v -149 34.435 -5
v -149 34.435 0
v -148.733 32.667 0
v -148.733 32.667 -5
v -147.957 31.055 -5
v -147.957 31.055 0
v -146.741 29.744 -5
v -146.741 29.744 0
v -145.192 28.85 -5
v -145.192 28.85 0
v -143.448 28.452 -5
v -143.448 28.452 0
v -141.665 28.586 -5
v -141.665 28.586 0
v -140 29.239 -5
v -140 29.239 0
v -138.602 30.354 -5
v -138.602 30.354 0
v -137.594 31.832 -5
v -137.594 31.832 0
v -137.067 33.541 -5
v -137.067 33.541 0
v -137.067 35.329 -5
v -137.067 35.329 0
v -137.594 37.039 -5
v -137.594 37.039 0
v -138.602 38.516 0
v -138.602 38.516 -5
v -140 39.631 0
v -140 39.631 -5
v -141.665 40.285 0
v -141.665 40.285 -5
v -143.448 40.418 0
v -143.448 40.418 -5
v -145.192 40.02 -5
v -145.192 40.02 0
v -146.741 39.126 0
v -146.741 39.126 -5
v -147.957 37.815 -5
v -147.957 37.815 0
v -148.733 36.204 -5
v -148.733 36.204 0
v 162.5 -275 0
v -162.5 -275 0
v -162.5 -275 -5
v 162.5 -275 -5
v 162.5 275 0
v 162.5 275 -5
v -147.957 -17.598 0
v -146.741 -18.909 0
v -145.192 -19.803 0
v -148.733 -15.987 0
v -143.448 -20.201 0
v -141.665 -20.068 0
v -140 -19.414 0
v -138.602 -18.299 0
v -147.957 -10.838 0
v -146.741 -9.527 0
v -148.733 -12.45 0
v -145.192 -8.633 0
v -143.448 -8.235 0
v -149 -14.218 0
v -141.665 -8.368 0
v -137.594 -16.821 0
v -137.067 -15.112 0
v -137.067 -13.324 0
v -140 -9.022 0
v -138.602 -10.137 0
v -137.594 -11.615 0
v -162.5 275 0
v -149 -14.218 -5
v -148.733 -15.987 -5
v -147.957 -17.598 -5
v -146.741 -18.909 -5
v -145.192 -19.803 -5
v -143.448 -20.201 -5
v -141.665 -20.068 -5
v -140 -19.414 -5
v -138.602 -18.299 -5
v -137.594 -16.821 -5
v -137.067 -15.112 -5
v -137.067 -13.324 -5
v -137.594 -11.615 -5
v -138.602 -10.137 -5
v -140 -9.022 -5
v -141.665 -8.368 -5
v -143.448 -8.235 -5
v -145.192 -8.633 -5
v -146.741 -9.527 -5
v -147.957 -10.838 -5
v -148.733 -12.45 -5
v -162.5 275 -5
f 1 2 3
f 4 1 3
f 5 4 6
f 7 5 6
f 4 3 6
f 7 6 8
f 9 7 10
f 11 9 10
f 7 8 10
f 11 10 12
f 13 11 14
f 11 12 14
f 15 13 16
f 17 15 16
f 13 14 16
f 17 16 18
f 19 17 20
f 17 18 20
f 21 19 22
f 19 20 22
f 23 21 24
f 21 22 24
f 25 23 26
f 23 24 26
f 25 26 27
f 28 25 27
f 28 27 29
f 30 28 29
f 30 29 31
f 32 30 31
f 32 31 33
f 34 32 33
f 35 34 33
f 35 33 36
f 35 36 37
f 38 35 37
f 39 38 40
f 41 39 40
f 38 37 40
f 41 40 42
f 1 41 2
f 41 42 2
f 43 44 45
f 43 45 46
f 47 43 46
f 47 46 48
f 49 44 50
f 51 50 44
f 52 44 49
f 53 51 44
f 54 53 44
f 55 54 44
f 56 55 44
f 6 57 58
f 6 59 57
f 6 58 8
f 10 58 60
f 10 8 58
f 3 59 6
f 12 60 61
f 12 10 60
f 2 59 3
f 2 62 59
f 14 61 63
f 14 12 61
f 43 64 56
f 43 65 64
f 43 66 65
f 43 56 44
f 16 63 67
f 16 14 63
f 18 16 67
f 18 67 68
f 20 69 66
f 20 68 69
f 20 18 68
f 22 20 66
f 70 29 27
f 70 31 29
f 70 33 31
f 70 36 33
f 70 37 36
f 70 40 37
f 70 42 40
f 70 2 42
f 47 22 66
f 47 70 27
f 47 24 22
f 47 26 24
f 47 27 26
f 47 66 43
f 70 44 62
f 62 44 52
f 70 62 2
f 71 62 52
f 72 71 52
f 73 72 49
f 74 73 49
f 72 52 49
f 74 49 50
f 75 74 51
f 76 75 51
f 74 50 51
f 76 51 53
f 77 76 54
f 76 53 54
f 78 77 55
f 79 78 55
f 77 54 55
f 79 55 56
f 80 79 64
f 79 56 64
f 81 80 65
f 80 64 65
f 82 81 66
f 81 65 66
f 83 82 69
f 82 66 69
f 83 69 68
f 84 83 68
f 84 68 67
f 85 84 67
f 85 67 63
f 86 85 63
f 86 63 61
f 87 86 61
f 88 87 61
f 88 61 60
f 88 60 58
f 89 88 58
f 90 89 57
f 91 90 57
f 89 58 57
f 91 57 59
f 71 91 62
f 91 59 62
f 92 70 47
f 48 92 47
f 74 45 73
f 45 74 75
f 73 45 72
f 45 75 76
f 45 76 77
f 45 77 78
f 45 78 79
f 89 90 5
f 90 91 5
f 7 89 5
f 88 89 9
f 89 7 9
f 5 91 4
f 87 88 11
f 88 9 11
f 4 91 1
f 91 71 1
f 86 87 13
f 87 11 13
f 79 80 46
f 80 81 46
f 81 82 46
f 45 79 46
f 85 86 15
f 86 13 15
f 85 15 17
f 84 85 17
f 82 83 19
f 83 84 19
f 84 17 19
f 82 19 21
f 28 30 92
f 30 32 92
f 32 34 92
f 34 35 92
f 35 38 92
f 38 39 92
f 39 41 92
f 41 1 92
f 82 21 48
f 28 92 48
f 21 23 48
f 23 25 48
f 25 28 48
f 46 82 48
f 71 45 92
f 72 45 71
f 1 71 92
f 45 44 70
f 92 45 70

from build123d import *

# Parameters (mm, degrees)
SKETCH1_W          = 325
SKETCH1_H          = 550
SKETCH1_R          = 6
BASE_FLANGE1_DEPTH = 5


# Sheet-metal steps are written as plain solids
with BuildPart() as part:
    # Sketch1 → Base-Flange1 (new body)
    with BuildSketch(Plane.XY):
        Rectangle(SKETCH1_W, SKETCH1_H)
        with Locations(Location((-143, -14.218036313, 0), (0, 0, 180))):
            Circle(SKETCH1_R, mode=Mode.SUBTRACT)
        with Locations(Location((-143, 34.435225531, 0), (0, 0, 180))):
            Circle(SKETCH1_R, mode=Mode.SUBTRACT)
    extrude(amount=-BASE_FLANGE1_DEPTH)


solid = part.part
